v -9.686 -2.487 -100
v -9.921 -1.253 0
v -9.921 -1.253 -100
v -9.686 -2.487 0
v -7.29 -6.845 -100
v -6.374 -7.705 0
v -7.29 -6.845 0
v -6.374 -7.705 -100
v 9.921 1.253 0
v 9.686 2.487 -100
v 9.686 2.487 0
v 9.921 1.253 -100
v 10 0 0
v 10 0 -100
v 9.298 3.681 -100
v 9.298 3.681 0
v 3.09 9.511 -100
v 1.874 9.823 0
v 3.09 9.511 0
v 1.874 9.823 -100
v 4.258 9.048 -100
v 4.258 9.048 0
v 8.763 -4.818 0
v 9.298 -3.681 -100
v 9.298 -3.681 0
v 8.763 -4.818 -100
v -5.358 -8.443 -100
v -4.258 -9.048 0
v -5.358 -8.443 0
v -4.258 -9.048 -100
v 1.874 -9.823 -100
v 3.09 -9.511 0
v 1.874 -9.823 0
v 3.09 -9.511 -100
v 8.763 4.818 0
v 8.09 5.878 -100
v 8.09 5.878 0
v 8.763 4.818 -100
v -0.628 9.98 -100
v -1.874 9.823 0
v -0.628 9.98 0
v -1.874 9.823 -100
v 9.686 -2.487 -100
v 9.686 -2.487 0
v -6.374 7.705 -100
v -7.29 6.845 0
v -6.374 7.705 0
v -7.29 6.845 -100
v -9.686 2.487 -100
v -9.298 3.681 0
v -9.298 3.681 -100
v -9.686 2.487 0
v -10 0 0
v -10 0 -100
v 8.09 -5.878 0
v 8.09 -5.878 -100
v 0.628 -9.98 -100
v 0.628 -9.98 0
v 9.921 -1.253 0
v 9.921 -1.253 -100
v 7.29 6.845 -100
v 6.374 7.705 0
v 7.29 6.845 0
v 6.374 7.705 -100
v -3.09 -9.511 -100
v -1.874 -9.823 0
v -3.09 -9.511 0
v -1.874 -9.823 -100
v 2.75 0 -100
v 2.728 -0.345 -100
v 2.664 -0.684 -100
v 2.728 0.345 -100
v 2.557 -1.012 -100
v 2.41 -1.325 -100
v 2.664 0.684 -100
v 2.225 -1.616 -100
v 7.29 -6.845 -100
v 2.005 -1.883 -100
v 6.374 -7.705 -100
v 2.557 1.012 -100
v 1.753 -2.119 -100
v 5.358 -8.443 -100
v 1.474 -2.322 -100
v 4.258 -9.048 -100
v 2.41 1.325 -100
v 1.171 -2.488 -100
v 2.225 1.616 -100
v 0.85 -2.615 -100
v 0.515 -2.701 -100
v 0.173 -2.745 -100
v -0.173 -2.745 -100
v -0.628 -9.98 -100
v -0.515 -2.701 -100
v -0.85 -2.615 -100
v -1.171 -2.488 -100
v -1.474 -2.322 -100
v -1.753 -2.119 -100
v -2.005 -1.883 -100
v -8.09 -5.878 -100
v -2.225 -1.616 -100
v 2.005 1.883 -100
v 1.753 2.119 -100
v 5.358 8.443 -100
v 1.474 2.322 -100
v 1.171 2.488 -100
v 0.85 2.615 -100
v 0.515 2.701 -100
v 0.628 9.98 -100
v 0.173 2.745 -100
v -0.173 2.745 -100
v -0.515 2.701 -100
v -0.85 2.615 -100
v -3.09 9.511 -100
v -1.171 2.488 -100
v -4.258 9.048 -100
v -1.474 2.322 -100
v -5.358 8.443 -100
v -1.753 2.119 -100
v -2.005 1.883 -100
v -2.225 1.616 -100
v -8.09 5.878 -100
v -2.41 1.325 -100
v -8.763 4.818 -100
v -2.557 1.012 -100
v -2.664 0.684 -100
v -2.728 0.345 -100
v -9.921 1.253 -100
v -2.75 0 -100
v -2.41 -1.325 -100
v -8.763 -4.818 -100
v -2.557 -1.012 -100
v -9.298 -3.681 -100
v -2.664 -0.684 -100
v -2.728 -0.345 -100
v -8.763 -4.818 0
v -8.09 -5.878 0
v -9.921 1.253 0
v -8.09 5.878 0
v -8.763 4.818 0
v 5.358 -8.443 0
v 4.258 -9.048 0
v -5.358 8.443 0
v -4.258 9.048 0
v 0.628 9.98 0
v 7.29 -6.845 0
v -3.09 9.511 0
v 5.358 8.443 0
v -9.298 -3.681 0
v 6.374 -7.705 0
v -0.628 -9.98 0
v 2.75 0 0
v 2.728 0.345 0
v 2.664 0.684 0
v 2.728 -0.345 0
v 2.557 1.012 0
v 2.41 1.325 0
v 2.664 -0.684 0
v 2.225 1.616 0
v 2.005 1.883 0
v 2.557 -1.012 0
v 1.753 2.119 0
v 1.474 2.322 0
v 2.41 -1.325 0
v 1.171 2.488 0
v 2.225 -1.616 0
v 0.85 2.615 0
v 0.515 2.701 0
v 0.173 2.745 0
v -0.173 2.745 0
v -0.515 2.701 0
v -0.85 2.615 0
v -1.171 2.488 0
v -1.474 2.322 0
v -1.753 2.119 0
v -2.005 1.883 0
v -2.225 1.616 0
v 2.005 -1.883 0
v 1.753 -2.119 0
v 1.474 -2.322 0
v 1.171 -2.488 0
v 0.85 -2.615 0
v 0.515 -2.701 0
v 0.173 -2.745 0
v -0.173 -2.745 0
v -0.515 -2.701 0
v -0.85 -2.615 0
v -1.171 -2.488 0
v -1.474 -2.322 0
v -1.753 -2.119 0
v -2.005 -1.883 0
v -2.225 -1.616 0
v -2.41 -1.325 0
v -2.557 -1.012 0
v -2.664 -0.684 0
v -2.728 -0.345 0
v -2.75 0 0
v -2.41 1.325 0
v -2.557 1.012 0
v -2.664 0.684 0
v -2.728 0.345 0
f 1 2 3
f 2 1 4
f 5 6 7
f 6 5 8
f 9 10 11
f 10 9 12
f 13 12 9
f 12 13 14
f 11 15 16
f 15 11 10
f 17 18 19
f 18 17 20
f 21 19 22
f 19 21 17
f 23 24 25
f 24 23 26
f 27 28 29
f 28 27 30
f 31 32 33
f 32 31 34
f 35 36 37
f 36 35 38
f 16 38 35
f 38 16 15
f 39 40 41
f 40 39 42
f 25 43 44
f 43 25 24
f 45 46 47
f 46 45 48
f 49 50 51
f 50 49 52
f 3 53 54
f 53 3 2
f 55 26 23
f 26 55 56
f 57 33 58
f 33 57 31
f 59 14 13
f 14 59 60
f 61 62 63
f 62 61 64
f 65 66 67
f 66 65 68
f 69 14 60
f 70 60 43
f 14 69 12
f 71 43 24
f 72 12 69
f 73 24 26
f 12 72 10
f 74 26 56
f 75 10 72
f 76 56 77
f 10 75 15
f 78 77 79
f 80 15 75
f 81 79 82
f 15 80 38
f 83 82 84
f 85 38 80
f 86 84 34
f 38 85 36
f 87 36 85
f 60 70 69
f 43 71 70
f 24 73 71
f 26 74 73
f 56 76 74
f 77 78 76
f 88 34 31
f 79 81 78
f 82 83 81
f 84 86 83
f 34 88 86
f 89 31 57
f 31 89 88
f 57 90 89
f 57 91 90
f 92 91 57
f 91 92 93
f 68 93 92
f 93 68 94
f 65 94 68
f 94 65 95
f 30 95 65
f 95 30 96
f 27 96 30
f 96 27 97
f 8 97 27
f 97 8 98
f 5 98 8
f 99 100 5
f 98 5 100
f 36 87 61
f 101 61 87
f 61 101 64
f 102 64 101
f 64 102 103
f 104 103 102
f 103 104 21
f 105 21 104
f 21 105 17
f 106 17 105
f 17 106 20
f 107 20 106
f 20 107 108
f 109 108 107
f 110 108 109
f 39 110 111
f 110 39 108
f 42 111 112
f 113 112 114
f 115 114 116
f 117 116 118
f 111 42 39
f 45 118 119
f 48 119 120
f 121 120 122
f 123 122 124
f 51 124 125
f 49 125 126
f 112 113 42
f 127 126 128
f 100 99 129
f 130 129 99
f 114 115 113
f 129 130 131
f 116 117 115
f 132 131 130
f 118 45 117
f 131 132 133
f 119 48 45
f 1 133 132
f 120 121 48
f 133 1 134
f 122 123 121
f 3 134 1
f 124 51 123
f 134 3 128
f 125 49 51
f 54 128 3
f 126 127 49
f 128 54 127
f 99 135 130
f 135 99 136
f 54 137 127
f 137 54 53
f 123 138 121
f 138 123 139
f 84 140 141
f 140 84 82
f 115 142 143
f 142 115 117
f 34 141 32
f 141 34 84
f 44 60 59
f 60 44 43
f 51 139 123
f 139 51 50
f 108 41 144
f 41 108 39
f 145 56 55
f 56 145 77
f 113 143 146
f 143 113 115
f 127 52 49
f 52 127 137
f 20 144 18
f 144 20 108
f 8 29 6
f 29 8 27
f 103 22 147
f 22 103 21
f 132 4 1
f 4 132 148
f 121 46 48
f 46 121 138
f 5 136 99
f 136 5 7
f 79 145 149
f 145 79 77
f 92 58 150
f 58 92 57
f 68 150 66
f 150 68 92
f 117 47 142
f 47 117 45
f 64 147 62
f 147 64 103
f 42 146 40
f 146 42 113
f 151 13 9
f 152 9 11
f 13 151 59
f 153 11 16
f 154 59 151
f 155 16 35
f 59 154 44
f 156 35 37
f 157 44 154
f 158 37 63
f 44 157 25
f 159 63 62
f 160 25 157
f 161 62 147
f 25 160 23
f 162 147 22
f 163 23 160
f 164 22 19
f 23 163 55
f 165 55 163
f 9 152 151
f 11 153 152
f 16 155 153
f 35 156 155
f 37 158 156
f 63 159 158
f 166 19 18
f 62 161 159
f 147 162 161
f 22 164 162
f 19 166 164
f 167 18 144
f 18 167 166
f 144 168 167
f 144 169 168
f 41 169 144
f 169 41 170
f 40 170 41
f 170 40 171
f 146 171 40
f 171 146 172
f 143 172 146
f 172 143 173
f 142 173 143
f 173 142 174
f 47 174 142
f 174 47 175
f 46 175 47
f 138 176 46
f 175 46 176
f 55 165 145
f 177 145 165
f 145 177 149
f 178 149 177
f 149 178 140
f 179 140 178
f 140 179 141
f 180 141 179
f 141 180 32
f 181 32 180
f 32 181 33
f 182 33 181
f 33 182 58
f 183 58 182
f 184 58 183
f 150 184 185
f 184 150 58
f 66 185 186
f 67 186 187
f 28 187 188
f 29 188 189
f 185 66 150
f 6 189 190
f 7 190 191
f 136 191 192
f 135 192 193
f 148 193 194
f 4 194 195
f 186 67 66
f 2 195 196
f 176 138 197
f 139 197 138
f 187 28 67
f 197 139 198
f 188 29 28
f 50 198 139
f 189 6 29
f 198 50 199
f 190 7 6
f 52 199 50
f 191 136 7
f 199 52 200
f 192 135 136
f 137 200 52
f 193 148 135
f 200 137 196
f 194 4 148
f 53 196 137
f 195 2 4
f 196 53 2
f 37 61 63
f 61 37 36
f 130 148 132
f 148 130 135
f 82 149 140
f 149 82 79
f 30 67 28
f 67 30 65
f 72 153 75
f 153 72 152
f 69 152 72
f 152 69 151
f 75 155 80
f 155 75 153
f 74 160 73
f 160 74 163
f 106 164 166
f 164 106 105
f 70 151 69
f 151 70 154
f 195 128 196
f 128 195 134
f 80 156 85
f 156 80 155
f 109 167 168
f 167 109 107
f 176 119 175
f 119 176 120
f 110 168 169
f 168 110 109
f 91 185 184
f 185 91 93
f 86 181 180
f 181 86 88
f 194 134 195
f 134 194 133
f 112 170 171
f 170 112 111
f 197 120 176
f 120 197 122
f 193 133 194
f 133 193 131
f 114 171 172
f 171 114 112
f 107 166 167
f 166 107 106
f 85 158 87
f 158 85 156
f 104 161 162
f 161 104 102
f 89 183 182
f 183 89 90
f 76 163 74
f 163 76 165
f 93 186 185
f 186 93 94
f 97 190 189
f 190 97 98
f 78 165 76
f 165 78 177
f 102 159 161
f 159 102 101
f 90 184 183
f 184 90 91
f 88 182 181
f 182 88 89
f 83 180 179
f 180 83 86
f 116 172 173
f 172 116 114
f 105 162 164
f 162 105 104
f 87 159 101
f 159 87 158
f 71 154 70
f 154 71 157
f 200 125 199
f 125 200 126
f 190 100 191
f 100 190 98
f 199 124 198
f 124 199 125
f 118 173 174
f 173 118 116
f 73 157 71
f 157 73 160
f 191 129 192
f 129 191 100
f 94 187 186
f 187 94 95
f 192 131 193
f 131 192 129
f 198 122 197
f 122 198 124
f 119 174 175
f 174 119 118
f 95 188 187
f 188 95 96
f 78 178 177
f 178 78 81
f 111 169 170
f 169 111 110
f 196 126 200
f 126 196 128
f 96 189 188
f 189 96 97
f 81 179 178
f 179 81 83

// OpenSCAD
$fn = 50;


difference() {
	union() {
		translate(v = [0, 0, -100.0000000000]) {
			cylinder(h = 100, r = 10.0000000000);
		}
	}
	union() {
		#translate(v = [0, 0, -100]) {
			cylinder(h = 100, r = 2.7500000000);
		}
	}
}
